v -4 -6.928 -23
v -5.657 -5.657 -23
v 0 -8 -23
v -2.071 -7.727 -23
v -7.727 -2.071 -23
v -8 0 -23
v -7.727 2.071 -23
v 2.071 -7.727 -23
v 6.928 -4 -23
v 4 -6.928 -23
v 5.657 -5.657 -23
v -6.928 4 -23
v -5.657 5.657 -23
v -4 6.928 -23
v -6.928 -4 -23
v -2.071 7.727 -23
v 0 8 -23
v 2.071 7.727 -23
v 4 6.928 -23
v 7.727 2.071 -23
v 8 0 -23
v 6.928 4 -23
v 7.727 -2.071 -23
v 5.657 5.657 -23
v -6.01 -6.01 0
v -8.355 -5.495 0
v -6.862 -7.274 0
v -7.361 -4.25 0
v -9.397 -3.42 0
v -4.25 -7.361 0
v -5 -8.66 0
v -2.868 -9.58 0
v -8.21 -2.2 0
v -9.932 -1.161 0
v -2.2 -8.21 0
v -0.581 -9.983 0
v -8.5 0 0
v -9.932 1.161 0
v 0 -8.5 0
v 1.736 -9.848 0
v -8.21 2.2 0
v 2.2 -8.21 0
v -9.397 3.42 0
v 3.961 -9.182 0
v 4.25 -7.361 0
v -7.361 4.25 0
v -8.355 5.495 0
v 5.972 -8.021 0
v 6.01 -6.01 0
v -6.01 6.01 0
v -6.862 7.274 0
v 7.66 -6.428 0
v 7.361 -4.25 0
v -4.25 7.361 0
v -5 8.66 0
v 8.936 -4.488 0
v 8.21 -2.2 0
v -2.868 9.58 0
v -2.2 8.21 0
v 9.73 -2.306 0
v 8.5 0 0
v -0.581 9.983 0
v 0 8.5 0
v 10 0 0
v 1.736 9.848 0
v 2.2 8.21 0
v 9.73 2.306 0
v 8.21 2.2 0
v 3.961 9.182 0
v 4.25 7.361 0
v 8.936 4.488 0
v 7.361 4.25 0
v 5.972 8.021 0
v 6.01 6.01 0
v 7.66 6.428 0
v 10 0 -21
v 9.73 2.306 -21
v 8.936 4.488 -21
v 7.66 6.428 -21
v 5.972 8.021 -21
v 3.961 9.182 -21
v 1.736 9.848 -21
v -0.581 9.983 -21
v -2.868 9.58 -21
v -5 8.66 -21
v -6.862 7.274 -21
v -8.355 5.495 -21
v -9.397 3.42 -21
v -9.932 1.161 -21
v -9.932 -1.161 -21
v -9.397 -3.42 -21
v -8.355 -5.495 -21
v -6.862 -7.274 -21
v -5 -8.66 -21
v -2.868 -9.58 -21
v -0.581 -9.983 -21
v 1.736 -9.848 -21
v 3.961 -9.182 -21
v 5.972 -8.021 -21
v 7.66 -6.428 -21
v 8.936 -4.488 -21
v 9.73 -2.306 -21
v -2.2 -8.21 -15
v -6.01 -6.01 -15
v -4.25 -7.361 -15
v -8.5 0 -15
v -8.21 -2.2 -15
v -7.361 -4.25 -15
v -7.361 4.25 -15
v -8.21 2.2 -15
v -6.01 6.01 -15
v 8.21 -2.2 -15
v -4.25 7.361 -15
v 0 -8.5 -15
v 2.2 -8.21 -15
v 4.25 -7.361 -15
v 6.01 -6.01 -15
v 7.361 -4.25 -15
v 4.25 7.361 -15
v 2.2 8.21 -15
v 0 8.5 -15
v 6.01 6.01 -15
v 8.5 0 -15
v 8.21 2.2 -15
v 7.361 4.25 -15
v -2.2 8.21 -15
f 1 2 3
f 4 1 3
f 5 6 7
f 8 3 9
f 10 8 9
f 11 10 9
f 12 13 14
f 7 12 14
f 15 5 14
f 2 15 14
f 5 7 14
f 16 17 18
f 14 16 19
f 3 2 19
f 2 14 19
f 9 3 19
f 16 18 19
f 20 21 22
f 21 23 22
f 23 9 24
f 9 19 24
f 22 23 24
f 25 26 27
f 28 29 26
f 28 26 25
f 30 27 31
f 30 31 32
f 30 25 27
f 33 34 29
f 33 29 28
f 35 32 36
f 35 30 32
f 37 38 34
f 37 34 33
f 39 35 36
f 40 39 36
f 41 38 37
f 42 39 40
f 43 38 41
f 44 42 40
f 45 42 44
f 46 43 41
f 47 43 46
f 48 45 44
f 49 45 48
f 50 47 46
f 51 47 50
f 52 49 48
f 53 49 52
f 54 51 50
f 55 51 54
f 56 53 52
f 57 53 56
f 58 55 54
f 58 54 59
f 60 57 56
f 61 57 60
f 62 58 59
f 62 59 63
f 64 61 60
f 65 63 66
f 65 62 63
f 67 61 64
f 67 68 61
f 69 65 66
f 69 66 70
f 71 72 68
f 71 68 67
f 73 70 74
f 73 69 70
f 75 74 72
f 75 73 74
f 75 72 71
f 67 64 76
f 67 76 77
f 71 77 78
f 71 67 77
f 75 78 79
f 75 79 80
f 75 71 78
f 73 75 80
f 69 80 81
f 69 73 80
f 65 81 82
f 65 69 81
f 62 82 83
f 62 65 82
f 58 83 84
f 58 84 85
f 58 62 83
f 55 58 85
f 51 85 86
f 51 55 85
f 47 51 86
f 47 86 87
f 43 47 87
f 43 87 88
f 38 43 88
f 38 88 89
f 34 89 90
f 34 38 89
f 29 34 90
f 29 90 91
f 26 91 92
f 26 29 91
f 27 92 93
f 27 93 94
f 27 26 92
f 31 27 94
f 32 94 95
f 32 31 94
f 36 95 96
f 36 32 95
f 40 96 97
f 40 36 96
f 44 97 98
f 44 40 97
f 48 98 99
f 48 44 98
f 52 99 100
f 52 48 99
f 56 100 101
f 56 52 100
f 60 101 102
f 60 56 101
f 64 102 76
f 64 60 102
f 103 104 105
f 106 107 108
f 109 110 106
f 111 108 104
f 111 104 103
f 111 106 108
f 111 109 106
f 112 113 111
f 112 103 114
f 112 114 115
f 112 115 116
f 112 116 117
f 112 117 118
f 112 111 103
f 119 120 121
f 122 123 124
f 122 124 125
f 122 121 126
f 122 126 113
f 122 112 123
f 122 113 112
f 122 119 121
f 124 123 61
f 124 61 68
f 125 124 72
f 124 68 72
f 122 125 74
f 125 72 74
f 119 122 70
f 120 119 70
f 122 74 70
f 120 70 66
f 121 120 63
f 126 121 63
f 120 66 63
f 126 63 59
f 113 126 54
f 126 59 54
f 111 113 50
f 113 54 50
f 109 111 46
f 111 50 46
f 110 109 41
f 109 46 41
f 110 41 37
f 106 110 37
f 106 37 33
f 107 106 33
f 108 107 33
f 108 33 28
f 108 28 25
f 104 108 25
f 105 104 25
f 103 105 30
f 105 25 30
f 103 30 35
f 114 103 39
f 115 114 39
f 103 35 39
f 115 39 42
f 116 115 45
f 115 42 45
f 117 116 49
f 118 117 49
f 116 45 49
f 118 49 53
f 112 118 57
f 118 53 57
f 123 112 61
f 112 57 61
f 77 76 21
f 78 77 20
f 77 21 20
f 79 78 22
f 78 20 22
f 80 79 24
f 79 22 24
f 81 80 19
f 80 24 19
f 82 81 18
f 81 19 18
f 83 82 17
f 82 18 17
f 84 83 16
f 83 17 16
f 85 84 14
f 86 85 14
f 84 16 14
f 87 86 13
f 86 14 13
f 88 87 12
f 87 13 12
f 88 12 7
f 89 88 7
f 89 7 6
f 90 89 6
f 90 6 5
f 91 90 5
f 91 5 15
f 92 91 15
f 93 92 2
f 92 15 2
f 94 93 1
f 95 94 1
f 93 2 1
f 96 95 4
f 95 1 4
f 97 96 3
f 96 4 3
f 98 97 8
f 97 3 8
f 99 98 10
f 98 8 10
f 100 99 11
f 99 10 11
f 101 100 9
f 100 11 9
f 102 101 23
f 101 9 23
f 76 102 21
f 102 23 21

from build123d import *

# Parameters (mm, degrees)
CROQUIS1_R              = 10
SALIENTE_EXTRUIR1_DEPTH = 23
CHAFL_N1_SIZE           = 2
CROQUIS2_R              = 8.5
CORTAR_EXTRUIR1_DEPTH   = 15


with BuildPart() as part:
    # Croquis1 → Saliente-Extruir1 (new body)
    with BuildSketch(Plane.XY):
        Circle(CROQUIS1_R)
    extrude(amount=-SALIENTE_EXTRUIR1_DEPTH)

    # Chaflán1
    chafl_n1_edges = [part.edges().sort_by_distance(p)[0] for p in [
        (-10, 0, -23),
    ]]
    chamfer(chafl_n1_edges, length=CHAFL_N1_SIZE)

    # Croquis2 → Cortar-Extruir1 (cut)
    with BuildSketch(Plane.XY):
        Circle(CROQUIS2_R)
    extrude(amount=-CORTAR_EXTRUIR1_DEPTH, mode=Mode.SUBTRACT)


solid = part.part
